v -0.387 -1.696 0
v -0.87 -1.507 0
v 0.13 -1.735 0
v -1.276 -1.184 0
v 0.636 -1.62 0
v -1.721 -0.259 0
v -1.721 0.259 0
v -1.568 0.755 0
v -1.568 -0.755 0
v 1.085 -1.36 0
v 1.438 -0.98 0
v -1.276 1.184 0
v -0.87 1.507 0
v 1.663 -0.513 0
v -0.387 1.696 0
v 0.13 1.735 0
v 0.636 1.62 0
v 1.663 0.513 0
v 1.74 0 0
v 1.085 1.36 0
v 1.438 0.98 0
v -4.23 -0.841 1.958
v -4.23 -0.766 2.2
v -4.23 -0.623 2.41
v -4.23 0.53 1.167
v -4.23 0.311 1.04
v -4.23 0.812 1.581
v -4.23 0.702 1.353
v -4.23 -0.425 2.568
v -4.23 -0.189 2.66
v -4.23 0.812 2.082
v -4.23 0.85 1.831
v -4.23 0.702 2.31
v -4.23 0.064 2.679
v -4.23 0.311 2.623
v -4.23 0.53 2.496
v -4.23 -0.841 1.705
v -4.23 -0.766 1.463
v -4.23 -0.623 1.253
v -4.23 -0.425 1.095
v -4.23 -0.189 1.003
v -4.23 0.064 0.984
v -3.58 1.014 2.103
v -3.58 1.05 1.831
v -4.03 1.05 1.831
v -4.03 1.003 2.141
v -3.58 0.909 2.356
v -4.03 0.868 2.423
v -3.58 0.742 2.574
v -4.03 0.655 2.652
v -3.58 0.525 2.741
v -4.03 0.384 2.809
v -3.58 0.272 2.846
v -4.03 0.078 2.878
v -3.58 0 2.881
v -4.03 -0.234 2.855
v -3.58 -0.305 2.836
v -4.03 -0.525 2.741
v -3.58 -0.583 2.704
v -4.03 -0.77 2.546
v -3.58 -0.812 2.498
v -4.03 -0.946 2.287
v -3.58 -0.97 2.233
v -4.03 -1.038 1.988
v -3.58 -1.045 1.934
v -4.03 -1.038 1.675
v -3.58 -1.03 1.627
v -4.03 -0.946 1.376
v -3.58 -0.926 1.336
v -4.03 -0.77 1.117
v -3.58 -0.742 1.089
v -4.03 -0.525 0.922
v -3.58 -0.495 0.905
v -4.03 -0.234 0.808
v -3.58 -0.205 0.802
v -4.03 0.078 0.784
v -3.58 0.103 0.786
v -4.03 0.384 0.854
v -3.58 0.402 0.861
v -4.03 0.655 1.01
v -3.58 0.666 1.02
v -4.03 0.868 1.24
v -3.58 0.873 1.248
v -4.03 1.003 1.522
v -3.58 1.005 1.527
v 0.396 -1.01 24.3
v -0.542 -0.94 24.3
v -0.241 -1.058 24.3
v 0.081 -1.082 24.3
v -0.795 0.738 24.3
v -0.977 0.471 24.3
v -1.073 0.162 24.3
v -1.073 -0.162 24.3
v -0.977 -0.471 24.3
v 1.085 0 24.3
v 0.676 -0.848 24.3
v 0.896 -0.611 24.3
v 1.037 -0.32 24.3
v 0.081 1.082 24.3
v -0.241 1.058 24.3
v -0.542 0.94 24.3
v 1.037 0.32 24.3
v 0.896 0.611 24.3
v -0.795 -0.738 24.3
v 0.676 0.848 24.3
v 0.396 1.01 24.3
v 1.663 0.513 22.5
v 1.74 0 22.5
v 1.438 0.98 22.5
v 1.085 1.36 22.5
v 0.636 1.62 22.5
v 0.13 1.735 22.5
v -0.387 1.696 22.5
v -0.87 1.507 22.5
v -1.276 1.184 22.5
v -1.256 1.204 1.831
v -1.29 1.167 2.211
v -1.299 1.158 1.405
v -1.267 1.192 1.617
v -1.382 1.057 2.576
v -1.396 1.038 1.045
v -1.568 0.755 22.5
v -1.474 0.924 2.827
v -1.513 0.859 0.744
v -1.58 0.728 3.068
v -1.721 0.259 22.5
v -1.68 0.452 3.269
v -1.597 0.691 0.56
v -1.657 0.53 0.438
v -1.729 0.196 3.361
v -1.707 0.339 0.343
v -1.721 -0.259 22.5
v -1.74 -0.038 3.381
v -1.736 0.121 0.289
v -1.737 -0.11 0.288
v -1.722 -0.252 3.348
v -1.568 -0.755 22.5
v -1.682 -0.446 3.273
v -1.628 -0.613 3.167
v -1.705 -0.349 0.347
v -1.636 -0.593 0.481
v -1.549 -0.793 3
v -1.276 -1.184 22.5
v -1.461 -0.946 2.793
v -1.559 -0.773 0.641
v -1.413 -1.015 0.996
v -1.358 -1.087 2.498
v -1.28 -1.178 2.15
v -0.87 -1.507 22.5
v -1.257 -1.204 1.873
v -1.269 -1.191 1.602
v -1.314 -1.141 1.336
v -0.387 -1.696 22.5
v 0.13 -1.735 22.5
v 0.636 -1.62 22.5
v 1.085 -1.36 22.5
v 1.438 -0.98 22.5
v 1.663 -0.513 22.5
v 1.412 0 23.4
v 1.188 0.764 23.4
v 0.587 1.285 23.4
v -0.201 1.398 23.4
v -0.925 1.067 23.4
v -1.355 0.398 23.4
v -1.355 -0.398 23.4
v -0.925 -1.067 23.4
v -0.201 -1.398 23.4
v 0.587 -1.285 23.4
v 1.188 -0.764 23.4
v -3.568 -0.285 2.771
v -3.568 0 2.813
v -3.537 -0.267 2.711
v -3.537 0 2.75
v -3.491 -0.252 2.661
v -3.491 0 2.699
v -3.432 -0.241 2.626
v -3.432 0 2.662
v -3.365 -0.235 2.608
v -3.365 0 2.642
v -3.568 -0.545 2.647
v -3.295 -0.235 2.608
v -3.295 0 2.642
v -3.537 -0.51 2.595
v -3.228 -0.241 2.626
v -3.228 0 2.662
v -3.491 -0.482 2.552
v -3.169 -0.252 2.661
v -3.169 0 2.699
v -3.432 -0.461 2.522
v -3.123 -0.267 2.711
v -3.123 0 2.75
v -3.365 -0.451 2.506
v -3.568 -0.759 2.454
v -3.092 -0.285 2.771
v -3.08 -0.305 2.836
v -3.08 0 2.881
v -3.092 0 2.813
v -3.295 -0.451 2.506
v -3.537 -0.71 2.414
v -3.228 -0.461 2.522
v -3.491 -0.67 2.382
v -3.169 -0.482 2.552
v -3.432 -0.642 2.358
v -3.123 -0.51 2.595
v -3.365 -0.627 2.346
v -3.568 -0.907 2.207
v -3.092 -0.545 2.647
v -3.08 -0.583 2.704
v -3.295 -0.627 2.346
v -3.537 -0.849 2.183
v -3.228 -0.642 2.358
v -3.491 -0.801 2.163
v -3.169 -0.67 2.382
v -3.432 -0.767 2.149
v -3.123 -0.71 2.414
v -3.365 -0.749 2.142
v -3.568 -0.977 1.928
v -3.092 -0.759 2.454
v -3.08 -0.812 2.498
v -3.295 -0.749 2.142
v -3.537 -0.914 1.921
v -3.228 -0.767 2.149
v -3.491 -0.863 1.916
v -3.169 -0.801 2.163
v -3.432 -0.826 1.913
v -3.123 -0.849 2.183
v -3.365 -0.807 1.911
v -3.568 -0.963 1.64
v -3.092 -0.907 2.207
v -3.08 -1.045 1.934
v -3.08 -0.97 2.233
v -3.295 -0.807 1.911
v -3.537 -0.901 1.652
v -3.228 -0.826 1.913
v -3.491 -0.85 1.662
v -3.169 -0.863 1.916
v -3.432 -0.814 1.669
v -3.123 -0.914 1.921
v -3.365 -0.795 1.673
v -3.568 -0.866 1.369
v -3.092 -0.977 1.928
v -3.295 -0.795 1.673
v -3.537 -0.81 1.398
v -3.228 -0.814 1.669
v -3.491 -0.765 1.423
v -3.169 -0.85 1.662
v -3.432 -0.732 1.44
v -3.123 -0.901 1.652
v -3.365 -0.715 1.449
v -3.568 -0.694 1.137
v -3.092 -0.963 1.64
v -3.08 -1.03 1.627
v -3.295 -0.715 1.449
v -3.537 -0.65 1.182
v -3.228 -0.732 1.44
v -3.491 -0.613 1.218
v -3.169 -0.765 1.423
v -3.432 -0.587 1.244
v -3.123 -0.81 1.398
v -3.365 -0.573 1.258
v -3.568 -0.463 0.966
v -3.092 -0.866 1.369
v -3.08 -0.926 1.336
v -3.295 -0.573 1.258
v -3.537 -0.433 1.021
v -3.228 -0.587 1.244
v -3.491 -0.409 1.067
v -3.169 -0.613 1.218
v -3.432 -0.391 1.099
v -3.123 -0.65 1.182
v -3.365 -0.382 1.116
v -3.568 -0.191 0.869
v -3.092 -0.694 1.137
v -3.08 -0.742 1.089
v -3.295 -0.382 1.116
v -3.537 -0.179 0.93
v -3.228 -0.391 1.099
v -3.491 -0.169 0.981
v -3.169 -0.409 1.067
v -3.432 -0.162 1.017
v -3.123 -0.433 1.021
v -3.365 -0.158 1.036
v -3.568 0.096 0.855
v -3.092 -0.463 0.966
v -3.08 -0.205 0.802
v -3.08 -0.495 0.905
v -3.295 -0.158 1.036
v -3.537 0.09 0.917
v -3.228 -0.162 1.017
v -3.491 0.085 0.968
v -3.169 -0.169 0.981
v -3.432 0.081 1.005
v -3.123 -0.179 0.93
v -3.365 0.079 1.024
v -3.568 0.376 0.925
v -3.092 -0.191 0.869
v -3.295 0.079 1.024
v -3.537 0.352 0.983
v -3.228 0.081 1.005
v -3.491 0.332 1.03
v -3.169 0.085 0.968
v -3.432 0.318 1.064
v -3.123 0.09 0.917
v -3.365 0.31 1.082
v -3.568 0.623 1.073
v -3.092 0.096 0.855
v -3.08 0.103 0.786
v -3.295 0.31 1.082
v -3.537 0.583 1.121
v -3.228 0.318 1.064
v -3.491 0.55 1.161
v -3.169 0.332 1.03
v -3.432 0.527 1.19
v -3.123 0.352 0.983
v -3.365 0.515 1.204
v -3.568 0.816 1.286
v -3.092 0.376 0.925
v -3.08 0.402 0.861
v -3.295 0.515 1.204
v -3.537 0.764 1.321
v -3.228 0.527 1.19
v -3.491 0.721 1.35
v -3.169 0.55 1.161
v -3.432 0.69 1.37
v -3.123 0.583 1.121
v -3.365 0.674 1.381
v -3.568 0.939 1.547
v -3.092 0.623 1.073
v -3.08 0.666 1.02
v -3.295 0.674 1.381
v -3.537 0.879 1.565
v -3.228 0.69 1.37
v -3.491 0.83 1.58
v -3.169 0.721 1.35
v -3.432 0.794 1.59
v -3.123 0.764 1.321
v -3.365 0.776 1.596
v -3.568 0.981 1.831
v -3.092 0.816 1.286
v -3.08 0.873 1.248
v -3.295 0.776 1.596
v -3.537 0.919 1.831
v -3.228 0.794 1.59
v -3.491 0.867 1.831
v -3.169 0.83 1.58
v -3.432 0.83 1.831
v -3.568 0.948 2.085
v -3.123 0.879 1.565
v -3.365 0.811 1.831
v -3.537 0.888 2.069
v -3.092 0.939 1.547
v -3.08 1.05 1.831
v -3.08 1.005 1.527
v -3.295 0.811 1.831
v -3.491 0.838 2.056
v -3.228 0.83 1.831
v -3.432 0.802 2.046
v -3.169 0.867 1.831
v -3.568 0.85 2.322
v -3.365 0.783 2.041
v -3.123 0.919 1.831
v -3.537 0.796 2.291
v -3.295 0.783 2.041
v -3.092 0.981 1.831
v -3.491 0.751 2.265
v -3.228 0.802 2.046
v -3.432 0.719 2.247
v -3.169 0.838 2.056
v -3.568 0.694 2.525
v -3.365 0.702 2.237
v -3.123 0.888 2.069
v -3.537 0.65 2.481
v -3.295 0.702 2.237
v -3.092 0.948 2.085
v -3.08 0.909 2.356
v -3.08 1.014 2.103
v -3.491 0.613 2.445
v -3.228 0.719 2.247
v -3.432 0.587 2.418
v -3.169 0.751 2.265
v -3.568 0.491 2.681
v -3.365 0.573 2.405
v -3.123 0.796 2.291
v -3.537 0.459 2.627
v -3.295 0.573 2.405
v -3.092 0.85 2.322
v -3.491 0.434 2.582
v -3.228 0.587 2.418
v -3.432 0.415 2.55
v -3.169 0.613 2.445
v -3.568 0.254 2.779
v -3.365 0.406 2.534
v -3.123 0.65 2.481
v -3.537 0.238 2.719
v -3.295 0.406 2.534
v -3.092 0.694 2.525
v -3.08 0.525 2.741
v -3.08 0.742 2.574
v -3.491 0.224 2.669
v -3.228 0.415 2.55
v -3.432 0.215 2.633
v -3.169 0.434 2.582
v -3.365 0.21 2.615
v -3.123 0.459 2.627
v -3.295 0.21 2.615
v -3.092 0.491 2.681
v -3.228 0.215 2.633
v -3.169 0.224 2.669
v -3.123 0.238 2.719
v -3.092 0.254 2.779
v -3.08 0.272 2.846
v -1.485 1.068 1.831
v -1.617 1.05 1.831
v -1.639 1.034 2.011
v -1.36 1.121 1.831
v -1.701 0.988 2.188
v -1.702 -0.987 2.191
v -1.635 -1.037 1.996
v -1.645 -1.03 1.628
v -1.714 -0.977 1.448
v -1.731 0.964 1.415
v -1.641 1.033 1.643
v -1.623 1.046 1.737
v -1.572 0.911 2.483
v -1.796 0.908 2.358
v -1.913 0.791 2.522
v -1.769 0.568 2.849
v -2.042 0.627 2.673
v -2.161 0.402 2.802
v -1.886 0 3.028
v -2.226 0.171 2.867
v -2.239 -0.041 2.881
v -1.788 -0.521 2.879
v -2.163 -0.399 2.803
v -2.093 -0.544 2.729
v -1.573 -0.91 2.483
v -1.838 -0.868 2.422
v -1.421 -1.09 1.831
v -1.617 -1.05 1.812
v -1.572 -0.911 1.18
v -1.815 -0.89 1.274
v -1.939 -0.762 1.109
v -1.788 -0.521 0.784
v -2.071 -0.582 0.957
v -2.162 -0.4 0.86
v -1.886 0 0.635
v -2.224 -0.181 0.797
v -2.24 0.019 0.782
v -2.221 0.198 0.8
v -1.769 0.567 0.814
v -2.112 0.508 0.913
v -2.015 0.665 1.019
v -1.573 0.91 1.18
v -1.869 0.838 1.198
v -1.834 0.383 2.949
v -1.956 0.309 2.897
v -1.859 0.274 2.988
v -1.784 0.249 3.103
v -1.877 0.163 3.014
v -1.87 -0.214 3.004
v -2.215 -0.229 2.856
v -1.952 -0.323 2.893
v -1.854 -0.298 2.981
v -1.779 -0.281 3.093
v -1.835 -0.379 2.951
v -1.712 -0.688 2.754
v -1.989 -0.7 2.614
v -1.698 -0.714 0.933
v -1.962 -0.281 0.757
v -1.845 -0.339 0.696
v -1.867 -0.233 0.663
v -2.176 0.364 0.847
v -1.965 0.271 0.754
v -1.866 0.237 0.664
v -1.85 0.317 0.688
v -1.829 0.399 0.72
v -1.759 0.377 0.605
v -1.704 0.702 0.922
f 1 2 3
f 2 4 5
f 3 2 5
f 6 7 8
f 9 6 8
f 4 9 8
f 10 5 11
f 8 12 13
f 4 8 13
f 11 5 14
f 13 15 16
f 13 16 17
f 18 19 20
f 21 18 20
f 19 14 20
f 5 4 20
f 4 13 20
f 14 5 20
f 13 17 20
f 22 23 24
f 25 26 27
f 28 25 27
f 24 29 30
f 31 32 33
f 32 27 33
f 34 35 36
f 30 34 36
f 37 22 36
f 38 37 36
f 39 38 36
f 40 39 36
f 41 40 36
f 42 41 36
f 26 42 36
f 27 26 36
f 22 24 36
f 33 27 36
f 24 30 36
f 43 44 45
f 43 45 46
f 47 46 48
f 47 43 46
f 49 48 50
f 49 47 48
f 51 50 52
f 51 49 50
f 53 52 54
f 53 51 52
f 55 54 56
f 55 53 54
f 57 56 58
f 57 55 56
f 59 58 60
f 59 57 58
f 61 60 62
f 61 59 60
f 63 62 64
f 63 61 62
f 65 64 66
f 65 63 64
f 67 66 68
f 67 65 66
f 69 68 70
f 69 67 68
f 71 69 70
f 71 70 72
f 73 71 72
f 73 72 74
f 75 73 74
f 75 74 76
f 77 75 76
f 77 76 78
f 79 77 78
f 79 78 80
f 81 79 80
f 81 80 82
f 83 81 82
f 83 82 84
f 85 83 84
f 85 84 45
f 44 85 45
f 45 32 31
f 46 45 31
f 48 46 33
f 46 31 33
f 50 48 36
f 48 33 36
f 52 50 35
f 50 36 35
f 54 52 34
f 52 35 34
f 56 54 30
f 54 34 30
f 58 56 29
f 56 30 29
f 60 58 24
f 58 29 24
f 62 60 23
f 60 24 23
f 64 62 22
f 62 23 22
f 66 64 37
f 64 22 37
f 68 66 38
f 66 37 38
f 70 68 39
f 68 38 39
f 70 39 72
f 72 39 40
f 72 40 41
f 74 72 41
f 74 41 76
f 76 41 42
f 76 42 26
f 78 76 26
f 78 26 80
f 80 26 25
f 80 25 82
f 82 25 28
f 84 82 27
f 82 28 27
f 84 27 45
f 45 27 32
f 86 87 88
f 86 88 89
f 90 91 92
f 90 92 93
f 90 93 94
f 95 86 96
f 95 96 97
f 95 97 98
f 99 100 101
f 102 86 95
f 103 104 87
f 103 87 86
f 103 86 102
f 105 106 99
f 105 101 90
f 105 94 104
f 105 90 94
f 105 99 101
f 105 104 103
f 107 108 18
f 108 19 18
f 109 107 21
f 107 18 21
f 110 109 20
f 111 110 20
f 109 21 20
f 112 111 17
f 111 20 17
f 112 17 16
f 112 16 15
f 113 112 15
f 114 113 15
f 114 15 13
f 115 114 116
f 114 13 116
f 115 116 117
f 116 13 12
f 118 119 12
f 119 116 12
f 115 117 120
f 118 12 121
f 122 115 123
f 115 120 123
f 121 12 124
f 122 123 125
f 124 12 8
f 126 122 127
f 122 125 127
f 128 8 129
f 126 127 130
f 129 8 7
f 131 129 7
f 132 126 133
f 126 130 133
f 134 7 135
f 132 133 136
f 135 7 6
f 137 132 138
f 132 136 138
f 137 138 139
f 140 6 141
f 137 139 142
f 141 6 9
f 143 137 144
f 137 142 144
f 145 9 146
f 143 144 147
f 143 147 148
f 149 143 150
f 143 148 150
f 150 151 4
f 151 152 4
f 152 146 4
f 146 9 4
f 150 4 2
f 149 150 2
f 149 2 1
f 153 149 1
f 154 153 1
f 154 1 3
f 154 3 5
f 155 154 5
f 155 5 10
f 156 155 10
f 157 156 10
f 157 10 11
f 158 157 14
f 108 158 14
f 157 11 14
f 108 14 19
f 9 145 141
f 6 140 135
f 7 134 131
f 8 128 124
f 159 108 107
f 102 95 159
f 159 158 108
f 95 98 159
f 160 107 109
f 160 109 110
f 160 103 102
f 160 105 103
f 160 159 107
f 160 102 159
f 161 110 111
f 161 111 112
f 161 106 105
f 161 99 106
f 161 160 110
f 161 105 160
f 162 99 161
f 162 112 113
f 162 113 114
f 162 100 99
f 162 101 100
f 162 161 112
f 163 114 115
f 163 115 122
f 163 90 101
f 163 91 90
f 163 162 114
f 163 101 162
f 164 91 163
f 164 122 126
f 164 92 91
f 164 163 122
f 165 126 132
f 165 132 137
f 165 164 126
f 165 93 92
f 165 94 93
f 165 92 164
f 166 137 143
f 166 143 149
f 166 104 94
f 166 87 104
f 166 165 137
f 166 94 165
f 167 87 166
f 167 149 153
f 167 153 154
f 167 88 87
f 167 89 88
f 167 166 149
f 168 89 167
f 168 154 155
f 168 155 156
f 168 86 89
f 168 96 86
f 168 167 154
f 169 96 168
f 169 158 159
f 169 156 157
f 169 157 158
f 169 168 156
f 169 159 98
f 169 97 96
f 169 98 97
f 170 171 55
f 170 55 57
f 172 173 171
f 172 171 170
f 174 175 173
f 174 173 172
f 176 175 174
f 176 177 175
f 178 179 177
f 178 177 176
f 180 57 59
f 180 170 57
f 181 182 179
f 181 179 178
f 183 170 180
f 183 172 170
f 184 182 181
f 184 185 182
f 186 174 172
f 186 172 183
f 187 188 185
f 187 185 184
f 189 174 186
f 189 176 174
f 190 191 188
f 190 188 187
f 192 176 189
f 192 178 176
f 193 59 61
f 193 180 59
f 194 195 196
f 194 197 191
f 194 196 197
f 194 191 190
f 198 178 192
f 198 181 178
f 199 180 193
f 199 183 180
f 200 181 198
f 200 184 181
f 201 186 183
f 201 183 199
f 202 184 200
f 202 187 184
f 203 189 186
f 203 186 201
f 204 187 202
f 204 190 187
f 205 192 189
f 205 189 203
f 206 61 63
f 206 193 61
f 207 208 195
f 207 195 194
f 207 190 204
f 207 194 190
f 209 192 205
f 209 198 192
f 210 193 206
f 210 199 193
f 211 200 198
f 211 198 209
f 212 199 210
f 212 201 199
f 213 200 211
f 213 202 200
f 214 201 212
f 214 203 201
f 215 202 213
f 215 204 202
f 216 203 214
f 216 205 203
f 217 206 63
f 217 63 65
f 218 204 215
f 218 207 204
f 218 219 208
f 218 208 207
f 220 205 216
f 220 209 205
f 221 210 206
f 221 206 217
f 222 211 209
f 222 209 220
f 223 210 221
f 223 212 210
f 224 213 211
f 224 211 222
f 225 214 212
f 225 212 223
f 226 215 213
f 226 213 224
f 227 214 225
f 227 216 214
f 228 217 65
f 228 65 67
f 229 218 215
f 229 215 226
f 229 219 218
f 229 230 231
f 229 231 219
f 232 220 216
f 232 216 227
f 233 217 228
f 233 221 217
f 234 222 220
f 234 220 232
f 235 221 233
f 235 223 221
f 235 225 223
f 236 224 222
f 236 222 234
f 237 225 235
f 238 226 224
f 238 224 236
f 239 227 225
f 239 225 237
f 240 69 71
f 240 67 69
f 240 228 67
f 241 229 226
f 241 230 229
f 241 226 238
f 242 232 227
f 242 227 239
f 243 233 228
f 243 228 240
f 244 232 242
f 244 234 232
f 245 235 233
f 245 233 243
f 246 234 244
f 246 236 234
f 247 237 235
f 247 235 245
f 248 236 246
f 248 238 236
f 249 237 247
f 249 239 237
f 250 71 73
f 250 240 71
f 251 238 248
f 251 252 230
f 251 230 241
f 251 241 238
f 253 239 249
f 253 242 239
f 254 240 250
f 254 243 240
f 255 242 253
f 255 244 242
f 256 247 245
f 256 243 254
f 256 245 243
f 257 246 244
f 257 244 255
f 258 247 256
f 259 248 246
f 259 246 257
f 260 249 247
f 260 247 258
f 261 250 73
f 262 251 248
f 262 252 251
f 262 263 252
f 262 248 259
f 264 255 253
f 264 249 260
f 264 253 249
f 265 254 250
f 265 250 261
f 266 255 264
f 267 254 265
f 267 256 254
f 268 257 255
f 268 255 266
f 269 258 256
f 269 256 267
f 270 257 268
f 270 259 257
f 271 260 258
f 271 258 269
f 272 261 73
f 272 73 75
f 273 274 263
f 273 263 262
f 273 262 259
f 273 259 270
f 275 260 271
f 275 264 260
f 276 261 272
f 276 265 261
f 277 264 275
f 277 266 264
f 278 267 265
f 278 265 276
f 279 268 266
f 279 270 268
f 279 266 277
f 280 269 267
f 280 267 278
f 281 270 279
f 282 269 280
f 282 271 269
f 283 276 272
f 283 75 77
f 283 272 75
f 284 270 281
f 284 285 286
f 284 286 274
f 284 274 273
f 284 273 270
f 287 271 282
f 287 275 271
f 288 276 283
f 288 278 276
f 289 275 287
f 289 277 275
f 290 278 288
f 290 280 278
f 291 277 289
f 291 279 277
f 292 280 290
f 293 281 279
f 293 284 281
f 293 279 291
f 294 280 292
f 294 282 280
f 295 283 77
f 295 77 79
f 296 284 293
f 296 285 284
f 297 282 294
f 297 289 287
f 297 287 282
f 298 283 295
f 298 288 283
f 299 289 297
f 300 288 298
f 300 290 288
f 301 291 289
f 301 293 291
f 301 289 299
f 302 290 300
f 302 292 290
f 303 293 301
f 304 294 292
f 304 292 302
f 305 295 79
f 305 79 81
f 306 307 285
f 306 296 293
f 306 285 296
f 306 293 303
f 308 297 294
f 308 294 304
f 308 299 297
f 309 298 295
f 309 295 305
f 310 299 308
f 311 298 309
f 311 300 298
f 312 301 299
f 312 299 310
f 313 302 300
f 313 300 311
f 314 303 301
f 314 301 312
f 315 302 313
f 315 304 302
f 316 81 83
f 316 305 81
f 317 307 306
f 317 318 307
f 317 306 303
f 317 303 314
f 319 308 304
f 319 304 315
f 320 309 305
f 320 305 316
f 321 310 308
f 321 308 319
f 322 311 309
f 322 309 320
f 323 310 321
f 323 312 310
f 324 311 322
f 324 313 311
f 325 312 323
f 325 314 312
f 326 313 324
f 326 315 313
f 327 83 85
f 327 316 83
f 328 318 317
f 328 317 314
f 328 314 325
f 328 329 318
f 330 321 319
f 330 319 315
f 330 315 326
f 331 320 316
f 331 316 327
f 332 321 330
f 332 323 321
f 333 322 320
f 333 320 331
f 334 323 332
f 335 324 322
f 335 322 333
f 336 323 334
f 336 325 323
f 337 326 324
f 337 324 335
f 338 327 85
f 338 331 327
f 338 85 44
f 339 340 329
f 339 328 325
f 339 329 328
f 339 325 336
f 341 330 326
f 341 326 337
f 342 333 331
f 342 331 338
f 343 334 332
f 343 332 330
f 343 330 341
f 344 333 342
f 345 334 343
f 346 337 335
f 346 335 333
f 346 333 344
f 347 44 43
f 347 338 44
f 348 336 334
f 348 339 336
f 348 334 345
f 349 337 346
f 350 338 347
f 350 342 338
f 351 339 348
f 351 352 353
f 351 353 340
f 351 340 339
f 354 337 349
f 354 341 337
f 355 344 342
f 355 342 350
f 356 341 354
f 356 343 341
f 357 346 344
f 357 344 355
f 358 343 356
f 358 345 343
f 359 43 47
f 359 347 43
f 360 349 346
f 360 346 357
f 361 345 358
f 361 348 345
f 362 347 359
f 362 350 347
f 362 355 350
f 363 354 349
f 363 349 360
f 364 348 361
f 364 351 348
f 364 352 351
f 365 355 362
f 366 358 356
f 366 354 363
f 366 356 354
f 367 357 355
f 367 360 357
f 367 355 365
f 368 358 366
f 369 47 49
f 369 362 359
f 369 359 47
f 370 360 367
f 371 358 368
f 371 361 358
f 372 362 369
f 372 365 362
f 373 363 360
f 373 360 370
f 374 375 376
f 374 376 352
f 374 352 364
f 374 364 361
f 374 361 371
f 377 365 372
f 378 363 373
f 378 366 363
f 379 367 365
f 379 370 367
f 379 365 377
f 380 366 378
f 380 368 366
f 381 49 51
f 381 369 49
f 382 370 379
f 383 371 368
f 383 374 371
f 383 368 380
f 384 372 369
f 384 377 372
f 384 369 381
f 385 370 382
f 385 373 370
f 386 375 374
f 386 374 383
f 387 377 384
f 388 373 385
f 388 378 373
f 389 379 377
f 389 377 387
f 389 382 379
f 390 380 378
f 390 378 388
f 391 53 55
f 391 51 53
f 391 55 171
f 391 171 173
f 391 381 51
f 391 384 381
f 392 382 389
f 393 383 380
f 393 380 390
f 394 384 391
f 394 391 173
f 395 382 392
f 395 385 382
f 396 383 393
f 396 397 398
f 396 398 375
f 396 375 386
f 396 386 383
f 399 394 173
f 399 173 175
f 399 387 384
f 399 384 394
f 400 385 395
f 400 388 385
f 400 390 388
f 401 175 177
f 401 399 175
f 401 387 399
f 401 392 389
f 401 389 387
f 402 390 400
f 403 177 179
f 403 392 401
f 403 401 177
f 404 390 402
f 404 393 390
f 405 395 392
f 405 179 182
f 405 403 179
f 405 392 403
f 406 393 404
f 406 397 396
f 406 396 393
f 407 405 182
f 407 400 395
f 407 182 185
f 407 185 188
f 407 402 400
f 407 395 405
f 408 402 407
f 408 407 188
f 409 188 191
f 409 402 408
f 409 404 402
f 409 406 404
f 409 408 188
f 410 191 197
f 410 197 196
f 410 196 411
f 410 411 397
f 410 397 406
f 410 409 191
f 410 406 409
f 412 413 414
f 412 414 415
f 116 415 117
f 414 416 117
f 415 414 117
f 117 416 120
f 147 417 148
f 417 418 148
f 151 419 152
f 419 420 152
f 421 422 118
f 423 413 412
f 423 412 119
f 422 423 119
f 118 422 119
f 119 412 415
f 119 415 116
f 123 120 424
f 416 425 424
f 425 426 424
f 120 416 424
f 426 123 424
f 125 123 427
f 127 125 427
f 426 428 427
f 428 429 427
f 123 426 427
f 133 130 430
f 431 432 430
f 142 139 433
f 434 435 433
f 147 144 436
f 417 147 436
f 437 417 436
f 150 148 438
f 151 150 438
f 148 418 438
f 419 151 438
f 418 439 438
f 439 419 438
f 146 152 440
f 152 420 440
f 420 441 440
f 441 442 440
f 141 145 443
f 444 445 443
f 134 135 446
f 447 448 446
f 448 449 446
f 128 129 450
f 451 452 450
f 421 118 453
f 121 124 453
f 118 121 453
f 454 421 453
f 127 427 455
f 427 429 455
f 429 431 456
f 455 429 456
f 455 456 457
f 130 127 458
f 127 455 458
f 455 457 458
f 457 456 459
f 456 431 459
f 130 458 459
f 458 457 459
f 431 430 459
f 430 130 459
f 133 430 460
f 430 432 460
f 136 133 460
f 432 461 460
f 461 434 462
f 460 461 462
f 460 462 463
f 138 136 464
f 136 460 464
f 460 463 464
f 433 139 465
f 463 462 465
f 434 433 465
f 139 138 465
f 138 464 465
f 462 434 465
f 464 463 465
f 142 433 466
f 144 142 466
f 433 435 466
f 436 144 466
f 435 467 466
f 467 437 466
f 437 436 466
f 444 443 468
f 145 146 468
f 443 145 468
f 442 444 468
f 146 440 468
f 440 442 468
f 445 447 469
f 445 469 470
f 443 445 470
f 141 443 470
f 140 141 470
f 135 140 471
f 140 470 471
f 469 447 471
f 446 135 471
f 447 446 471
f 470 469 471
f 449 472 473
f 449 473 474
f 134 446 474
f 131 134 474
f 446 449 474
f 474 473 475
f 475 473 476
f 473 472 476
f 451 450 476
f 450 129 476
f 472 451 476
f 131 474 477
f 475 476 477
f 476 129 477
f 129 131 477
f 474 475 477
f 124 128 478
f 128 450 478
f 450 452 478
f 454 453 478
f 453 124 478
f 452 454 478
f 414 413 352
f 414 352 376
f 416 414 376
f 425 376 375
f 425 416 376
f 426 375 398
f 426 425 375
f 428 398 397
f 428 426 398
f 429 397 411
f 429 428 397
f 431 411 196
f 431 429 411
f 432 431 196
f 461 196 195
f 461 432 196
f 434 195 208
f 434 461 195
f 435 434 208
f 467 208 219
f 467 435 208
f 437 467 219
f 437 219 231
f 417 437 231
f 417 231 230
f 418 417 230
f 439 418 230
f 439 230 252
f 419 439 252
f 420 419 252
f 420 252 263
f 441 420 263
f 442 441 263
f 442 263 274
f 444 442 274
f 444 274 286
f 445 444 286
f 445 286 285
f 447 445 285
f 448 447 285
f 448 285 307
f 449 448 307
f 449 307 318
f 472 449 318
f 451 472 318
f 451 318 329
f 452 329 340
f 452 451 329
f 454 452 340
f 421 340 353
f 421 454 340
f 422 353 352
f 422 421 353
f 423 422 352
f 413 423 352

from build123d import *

# Parameters (mm, degrees)
F0_R     = 1.74
F1_DEPTH = 24.3
F2_SIZE2 = 0.655146
F2_SIZE  = 1.8
F3_R     = 1.05
F4_DEPTH = 4.23
F7_SIZE  = 0.2
F8_R     = 0.5


with BuildPart() as f1:
    # F0 (on Top) → F1 (new body)
    with BuildSketch(Plane.XY):
        Circle(F0_R)
    extrude(amount=F1_DEPTH)

    # F2
    f2_edges = [f1.edges().sort_by_distance(p)[0] for p in [
        (-1.74, 0, 24.3),
    ]]
    chamfer(f2_edges, length=F2_SIZE, length2=F2_SIZE2)

    # F3 (on Right) → F4 (join)
    with BuildSketch(Plane.YZ):
        with Locations((0, 1.831419)):
            Circle(F3_R)
    extrude(amount=-F4_DEPTH)

    # F5 (on Front) → F6 (revolve, cut)
    with BuildSketch(Plane.XZ):
        with BuildLine():
            Line((-3.08, 4.59), (-3.58, 4.59))
            Line((-3.58, 4.59), (-3.58, 2.89))
            ThreePointArc((-3.58, 2.89), (-3.33, 2.64), (-3.08, 2.89))
            Line((-3.08, 2.89), (-3.08, 4.59))
        make_face()
    revolve(axis=Axis((-4.23, 0, 1.831419), (1, 0, 0)), mode=Mode.SUBTRACT)

    # F7
    f7_edges = [f1.edges().sort_by_distance(p)[0] for p in [
        (-4.23, -1.05, 1.831419),
    ]]
    chamfer(f7_edges, length=F7_SIZE)

    # F8
    f8_edges = [f1.edges().sort_by_distance(p)[0] for p in [
        (-1.38748, -1.05, 1.831419),
    ]]
    fillet(f8_edges, radius=F8_R)


solid = f1.part
